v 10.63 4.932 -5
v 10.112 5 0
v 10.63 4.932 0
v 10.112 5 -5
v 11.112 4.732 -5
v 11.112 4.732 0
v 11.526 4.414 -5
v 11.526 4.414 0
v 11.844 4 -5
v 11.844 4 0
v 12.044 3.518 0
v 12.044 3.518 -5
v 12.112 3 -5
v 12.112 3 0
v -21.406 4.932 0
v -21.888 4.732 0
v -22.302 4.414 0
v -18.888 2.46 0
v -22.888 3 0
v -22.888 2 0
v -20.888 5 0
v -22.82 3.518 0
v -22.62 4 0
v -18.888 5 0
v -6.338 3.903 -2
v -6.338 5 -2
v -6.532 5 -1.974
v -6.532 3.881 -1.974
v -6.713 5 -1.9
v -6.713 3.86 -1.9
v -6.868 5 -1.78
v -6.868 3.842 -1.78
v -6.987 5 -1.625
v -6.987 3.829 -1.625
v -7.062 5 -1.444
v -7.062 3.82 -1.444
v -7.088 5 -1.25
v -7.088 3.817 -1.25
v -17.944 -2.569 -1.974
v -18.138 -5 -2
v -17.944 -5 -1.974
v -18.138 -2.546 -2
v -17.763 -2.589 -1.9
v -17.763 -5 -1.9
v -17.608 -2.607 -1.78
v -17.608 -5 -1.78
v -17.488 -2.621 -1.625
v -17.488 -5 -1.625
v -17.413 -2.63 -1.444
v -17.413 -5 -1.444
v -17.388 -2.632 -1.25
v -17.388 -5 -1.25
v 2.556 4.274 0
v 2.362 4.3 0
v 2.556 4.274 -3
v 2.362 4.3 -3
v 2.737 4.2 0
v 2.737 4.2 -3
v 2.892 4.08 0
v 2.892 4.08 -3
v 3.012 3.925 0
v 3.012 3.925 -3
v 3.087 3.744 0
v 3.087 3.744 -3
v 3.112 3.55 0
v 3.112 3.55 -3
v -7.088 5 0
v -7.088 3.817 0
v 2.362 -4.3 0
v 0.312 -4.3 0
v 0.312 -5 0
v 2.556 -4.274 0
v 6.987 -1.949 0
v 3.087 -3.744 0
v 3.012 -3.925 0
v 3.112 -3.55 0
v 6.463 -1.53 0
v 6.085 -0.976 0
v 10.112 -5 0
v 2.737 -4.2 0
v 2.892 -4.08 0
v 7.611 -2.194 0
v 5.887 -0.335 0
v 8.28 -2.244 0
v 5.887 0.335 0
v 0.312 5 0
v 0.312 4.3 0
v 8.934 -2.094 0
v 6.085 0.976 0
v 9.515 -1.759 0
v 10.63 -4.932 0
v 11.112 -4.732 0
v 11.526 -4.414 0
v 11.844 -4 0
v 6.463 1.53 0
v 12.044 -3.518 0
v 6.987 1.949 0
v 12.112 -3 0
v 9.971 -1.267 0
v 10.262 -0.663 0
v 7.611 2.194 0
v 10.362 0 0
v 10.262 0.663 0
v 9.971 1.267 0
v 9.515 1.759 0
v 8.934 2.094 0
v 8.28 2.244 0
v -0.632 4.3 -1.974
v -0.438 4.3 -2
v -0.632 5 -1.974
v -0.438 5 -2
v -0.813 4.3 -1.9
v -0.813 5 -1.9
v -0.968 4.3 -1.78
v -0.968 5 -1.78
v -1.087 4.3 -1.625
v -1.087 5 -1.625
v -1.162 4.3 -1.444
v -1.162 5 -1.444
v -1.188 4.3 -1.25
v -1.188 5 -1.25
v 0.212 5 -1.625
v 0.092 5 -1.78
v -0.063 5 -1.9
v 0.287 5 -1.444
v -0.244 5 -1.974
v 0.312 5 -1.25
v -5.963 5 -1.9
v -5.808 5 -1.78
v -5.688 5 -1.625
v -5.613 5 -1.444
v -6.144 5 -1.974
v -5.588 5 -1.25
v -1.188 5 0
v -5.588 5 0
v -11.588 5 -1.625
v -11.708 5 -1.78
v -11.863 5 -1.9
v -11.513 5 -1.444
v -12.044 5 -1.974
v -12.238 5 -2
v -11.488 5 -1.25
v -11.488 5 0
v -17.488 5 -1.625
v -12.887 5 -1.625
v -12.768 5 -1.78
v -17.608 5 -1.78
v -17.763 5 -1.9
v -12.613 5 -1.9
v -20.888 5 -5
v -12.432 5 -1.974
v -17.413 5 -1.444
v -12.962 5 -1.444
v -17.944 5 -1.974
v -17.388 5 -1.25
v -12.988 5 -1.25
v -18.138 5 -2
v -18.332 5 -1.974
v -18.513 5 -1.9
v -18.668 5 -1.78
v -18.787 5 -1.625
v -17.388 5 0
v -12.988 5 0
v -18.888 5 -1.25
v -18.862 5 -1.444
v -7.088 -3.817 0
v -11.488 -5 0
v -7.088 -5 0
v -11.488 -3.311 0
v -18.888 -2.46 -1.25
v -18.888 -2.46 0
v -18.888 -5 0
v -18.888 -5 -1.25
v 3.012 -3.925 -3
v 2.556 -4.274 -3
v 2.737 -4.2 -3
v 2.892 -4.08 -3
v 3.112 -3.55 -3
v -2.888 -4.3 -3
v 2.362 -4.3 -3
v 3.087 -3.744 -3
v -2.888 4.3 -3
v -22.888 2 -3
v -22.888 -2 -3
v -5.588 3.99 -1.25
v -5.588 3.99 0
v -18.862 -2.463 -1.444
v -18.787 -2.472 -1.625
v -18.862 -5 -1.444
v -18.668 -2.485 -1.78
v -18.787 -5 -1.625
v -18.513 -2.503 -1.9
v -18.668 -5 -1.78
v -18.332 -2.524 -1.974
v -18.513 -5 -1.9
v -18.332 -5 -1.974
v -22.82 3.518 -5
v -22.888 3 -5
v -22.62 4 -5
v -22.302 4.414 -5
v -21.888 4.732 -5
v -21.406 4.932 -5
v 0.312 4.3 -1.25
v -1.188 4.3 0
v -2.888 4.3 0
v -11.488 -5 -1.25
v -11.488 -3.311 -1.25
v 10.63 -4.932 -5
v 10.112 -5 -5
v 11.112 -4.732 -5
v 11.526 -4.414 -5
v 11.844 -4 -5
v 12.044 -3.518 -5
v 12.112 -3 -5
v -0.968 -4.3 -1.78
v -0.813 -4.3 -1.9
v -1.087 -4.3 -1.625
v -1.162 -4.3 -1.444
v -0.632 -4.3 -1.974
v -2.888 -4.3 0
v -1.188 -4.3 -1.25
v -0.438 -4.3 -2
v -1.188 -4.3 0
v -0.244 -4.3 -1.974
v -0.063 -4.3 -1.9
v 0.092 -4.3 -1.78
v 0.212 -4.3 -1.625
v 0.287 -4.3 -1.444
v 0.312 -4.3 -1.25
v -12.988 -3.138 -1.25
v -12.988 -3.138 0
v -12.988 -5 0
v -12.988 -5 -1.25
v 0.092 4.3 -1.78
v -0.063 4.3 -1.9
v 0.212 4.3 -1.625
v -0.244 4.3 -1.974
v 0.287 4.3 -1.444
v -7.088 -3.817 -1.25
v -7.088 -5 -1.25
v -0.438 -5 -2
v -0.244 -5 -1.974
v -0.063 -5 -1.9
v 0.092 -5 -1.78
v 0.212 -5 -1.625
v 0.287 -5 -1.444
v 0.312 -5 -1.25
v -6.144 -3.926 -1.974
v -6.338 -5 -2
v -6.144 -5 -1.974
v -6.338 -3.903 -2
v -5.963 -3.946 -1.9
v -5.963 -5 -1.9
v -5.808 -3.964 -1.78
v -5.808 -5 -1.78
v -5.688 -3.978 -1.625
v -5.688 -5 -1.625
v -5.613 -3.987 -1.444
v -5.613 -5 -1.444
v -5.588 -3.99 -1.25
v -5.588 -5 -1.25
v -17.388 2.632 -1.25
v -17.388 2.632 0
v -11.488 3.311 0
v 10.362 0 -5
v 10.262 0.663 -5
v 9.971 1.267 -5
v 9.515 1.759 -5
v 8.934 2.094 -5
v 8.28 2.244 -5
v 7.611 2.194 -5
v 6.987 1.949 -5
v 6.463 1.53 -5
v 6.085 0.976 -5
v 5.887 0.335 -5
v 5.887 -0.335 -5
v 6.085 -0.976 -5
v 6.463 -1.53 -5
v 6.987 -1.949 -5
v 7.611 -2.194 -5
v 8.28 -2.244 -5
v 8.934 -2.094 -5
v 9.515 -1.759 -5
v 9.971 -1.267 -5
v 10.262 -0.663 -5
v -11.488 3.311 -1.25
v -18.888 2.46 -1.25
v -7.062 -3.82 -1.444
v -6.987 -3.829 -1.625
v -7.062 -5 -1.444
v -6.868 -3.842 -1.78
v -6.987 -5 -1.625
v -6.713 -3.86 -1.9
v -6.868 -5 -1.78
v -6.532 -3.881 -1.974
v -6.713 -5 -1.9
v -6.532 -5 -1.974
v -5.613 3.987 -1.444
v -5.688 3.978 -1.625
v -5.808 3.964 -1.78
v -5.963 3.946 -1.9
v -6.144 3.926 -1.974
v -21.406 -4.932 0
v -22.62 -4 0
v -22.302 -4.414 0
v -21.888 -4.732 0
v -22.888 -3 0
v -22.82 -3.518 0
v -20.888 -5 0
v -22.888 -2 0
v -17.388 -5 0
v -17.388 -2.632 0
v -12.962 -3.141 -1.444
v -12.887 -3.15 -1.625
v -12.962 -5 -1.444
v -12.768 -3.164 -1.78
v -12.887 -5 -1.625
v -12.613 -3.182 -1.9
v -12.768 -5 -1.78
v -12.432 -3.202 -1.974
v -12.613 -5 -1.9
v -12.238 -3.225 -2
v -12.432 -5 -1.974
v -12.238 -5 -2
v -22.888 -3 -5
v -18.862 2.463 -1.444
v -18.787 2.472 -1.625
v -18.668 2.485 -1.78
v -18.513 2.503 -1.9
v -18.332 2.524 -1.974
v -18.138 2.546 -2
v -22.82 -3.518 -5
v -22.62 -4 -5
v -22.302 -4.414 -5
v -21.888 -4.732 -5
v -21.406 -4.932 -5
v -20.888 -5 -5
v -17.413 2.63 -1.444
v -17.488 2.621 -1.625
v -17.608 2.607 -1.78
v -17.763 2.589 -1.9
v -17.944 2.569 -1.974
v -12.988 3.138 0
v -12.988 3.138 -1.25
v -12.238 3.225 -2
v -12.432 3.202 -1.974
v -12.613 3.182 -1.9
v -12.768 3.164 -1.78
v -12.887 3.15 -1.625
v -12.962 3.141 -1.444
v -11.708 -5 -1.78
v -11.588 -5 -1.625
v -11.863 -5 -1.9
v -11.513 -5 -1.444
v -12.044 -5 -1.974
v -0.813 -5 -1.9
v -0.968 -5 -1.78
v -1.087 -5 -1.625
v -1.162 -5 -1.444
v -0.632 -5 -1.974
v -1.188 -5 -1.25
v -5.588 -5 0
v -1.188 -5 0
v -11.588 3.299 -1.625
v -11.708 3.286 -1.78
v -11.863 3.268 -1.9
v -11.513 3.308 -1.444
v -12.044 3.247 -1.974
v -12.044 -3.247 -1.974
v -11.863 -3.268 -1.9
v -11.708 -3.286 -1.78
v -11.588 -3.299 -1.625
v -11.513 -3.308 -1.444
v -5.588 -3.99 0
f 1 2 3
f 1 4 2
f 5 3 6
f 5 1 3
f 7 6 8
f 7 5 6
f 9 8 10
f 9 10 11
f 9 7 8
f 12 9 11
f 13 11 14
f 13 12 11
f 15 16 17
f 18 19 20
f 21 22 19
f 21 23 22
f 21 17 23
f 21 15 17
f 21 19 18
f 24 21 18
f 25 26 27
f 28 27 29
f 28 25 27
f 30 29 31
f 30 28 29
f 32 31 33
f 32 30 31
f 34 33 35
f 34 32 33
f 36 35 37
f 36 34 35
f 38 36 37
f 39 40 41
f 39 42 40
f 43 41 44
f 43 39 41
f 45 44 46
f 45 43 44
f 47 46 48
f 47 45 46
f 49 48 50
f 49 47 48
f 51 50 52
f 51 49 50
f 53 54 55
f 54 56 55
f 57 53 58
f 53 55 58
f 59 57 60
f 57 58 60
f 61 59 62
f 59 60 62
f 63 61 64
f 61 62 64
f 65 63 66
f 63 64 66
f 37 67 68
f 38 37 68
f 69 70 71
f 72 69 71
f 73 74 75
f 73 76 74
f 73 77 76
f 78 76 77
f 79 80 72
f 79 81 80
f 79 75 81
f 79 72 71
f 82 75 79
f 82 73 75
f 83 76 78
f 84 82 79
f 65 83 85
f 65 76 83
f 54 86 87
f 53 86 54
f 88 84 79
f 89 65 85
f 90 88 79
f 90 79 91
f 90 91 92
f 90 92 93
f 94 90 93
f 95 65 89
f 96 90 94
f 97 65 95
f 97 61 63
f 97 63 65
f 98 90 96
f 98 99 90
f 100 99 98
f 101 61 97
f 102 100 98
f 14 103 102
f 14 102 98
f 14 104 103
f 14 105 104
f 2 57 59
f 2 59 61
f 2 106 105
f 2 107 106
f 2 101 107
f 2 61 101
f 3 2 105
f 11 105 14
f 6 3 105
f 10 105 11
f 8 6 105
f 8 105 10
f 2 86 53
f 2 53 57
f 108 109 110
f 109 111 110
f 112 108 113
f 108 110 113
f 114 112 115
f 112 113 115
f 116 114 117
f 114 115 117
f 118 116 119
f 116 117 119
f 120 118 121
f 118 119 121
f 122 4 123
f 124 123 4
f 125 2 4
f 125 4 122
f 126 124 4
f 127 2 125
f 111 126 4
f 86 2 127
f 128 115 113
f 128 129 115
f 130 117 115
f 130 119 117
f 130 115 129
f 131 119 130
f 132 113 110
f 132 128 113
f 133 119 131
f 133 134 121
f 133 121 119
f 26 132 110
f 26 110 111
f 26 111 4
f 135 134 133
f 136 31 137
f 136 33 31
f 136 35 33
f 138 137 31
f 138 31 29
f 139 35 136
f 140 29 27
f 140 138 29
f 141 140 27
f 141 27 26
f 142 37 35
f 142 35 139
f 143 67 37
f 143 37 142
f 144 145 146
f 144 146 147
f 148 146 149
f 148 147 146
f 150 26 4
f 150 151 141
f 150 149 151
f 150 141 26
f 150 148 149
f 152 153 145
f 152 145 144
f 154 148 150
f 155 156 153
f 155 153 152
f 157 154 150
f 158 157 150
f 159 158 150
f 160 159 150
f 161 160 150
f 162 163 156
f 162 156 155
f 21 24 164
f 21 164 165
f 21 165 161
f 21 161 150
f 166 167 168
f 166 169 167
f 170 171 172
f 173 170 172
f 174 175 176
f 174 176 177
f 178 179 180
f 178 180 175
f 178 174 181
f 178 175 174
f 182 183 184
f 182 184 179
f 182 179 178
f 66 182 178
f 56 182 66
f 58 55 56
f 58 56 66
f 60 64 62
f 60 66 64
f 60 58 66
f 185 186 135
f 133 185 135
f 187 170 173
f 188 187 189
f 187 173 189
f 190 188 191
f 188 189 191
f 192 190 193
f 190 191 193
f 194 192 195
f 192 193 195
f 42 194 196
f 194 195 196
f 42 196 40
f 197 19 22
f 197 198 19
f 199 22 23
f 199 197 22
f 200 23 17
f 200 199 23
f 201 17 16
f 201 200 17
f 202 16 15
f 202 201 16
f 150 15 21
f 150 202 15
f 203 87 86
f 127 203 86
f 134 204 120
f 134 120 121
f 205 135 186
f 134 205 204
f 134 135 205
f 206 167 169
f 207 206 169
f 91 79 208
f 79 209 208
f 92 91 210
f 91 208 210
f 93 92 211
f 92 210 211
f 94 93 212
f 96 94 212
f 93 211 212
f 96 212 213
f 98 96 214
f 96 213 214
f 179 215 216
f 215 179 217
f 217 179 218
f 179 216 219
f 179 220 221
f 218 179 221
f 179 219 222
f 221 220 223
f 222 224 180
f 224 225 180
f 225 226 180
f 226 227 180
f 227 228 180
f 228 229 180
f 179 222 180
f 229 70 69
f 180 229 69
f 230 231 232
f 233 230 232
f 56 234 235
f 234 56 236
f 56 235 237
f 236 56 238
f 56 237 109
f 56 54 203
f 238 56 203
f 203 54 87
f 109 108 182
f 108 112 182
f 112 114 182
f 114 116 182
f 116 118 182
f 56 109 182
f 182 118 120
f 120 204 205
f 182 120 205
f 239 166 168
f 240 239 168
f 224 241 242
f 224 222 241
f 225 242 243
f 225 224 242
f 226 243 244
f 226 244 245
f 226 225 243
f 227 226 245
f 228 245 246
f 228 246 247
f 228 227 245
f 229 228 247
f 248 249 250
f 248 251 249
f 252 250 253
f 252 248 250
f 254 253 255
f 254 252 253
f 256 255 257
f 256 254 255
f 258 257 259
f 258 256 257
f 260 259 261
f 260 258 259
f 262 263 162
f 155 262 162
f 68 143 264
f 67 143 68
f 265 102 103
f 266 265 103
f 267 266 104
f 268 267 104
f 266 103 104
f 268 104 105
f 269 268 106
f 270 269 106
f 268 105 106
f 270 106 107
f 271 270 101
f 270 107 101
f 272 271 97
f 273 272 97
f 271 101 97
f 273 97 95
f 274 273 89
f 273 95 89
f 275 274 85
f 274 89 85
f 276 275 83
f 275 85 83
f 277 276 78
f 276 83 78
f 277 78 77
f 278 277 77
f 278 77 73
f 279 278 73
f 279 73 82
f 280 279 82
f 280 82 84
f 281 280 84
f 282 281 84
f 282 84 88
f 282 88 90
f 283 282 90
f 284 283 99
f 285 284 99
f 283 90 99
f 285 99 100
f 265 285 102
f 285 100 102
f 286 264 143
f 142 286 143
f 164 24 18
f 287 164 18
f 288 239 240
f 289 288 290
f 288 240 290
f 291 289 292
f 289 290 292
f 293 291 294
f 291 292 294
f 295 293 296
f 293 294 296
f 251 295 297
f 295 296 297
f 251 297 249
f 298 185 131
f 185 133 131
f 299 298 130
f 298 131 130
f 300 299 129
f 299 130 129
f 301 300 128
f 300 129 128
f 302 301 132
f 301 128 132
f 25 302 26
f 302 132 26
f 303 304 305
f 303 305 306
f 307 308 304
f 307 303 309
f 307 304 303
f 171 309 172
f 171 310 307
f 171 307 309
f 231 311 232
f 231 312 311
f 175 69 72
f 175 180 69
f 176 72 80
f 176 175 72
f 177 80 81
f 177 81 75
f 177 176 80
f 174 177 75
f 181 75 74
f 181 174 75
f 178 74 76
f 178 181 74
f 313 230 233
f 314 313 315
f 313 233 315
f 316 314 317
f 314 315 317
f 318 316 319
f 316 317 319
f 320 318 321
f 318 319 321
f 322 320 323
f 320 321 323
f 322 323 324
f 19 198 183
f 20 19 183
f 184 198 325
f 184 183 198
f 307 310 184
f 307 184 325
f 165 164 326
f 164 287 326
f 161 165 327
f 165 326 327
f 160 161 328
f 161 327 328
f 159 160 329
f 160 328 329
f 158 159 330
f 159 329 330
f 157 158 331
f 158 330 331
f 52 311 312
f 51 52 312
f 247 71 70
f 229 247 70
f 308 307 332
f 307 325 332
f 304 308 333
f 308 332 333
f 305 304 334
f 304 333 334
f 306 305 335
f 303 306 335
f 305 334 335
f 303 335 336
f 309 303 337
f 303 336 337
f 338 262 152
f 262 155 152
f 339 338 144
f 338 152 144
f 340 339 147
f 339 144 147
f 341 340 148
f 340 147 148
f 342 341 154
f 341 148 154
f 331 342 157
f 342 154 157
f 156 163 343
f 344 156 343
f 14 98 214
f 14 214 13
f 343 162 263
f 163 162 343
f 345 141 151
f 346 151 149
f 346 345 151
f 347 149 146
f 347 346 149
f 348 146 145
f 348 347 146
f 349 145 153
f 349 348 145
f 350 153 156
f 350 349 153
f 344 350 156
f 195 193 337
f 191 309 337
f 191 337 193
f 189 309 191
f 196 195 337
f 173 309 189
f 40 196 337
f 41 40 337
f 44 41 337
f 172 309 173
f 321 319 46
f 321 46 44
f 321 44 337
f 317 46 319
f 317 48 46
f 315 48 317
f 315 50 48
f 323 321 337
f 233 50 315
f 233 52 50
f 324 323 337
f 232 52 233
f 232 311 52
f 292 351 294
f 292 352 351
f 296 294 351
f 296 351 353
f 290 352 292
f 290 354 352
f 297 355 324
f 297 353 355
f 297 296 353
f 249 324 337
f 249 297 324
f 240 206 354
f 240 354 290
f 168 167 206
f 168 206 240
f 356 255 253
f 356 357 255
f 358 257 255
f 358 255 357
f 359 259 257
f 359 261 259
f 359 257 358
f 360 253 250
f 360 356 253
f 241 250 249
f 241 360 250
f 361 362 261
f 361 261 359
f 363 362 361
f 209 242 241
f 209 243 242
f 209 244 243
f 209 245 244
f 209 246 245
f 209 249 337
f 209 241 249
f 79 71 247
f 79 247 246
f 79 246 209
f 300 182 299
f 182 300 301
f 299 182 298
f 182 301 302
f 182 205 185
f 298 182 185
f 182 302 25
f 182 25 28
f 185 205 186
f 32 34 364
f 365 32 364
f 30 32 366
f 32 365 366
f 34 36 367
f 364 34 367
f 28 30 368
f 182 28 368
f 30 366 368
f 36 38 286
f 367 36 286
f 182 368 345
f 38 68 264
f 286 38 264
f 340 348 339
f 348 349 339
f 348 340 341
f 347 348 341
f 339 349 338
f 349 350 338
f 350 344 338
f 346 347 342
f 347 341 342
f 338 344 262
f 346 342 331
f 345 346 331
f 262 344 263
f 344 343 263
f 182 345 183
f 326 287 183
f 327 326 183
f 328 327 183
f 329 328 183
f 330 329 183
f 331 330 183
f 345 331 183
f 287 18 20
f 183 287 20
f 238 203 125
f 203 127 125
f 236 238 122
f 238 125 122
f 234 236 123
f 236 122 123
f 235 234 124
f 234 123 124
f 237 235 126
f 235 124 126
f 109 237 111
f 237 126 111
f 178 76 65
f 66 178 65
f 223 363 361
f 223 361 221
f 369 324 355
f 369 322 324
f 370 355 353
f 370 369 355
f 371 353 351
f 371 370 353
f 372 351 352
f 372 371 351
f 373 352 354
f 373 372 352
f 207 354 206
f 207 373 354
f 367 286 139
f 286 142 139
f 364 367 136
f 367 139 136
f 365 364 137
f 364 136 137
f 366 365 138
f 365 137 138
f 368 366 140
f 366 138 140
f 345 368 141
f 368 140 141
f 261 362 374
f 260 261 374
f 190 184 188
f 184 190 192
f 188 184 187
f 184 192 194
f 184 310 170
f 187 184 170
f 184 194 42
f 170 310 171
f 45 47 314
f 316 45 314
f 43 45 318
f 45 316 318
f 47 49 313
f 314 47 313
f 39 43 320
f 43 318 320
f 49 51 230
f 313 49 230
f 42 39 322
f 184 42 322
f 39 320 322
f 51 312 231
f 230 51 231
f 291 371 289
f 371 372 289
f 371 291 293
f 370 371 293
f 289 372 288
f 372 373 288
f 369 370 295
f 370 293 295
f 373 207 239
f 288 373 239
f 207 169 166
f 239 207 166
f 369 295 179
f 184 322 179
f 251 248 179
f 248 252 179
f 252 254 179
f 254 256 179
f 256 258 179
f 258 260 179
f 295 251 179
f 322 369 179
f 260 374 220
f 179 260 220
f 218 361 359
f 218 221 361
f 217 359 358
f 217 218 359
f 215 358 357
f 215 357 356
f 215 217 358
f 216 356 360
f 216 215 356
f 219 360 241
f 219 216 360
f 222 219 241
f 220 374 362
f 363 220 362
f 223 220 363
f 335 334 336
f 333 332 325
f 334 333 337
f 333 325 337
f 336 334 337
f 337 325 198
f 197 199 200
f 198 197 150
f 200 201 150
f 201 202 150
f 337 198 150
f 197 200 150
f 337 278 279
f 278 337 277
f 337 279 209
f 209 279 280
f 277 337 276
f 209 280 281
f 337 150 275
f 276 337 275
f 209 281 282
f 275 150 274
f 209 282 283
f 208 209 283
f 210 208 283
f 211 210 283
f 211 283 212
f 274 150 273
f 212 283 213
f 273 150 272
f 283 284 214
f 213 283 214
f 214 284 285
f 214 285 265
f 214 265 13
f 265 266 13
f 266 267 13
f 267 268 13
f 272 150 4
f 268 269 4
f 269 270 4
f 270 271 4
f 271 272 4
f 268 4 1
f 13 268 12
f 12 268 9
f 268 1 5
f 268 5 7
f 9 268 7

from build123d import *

# Parameters (mm, degrees)
F0_W     = 1.5
F0_H     = 0.7
F0_R     = 2.25
F0_H_2   = 8.6
F0_W_2   = 2.8
F1_DEPTH = 5
F2_DEPTH = 3
F3_DEPTH = 2
F4_R     = 0.74999
F5_R     = 2


# Not quite as in the source:
# - a fillet or chamfer is up to 0.001 mm smaller than in the source, because OpenCascade refuses the exact size


with BuildPart() as f1:
    # F0 (on Top) → F1 (new body)
    with BuildSketch(Plane.XY):
        Polygon((-18.8879279066, 5), (-22.8879279066, 5), (-22.8879279066, 2), (-18.8879279066, 2.46), align=None)
        Polygon((-17.3879279066, 5), (-18.8879279066, 5), (-18.8879279066, 2.46), (-17.3879279066, 2.6325), align=None)
        Polygon((-18.8879279066, 2.46), (-22.8879279066, 2), (-22.8879279066, -2), (-18.8879279066, -2.46), align=None)
        Polygon((-12.9879279066, 5), (-17.3879279066, 5), (-17.3879279066, 2.6325), (-12.9879279066, 3.1385), align=None)
        Polygon((-18.8879279066, -2.46), (-22.8879279066, -2), (-22.8879279066, -5), (-18.8879279066, -5), align=None)
        Polygon((-11.4879279066, 5), (-12.9879279066, 5), (-12.9879279066, 3.1385), (-11.4879279066, 3.311), align=None)
        Polygon((-17.3879279066, -2.6325), (-18.8879279066, -2.46), (-18.8879279066, -5), (-17.3879279066, -5), align=None)
        Polygon((-7.0879279066, 5), (-11.4879279066, 5), (-11.4879279066, 3.311), (-7.0879279066, 3.817), align=None)
        Polygon((-12.9879279066, -3.1385), (-17.3879279066, -2.6325), (-17.3879279066, -5), (-12.9879279066, -5), align=None)
        Polygon((-5.5879279066, 5), (-7.0879279066, 5), (-7.0879279066, 3.817), (-5.5879279066, 3.9895), align=None)
        Polygon((-11.4879279066, -3.311), (-12.9879279066, -3.1385), (-12.9879279066, -5), (-11.4879279066, -5), align=None)
        Polygon((-1.1879279066, 5), (-5.5879279066, 5), (-5.5879279066, 3.9895), (-2.8879279066, 4.3), (-1.1879279066, 4.3), align=None)
        Polygon((-7.0879279066, -3.817), (-11.4879279066, -3.311), (-11.4879279066, -5), (-7.0879279066, -5), align=None)
        with Locations((-0.4379279066, 4.65)):
            Rectangle(F0_W, F0_H)
        Polygon((-5.5879279066, -3.9895), (-7.0879279066, -3.817), (-7.0879279066, -5), (-5.5879279066, -5), align=None)
        Polygon((12.1120720934, 5), (0.3120720934, 5), (0.3120720934, 4.3), (3.1120720934, 4.3), (3.1120720934, -4.3), (0.3120720934, -4.3), (0.3120720934, -5), (12.1120720934, -5), align=None)
        with Locations((8.1120720934, 0)):
            Circle(F0_R, mode=Mode.SUBTRACT)
        Polygon((-2.8879279066, -4.3), (-5.5879279066, -3.9895), (-5.5879279066, -5), (-1.1879279066, -5), (-1.1879279066, -4.3), align=None)
        with Locations((-0.4379279066, -4.65)):
            Rectangle(F0_W, F0_H)
        with Locations((-0.4379279066, 0)):
            Rectangle(F0_W, F0_H_2)
        Polygon((-5.5879279066, 3.9895), (-7.0879279066, 3.817), (-7.0879279066, -3.817), (-5.5879279066, -3.9895), align=None)
        Polygon((-17.3879279066, 2.6325), (-18.8879279066, 2.46), (-18.8879279066, -2.46), (-17.3879279066, -2.6325), align=None)
        Polygon((-12.9879279066, 3.1385), (-17.3879279066, 2.6325), (-17.3879279066, -2.6325), (-12.9879279066, -3.1385), align=None)
        Polygon((-7.0879279066, 3.817), (-11.4879279066, 3.311), (-11.4879279066, -3.311), (-7.0879279066, -3.817), align=None)
        Polygon((-11.4879279066, 3.311), (-12.9879279066, 3.1385), (-12.9879279066, -3.1385), (-11.4879279066, -3.311), align=None)
        Polygon((-2.8879279066, 4.3), (-5.5879279066, 3.9895), (-5.5879279066, -3.9895), (-2.8879279066, -4.3), (-1.1879279066, -4.3), (-1.1879279066, 4.3), align=None)
        with Locations((1.7120720934, 0)):
            Rectangle(F0_W_2, F0_H_2)
    extrude(amount=-F1_DEPTH)

    # F0 (on Top) → F2 (cut)
    with BuildSketch(Plane.XY):
        Polygon((-18.8879279066, 2.46), (-22.8879279066, 2), (-22.8879279066, -2), (-18.8879279066, -2.46), align=None)
        Polygon((-17.3879279066, 2.6325), (-18.8879279066, 2.46), (-18.8879279066, -2.46), (-17.3879279066, -2.6325), align=None)
        Polygon((-12.9879279066, 3.1385), (-17.3879279066, 2.6325), (-17.3879279066, -2.6325), (-12.9879279066, -3.1385), align=None)
        Polygon((-11.4879279066, 3.311), (-12.9879279066, 3.1385), (-12.9879279066, -3.1385), (-11.4879279066, -3.311), align=None)
        Polygon((-7.0879279066, 3.817), (-11.4879279066, 3.311), (-11.4879279066, -3.311), (-7.0879279066, -3.817), align=None)
        Polygon((-5.5879279066, 3.9895), (-7.0879279066, 3.817), (-7.0879279066, -3.817), (-5.5879279066, -3.9895), align=None)
        Polygon((-2.8879279066, 4.3), (-5.5879279066, 3.9895), (-5.5879279066, -3.9895), (-2.8879279066, -4.3), (-1.1879279066, -4.3), (-1.1879279066, 4.3), align=None)
        with Locations((-0.4379279066, 0)):
            Rectangle(F0_W, F0_H_2)
        with Locations((1.7120720934, 0)):
            Rectangle(F0_W_2, F0_H_2)
    extrude(amount=-F2_DEPTH, mode=Mode.SUBTRACT)

    # F0 (on Top) → F3 (cut)
    with BuildSketch(Plane.XY):
        Polygon((-17.3879279066, 5), (-18.8879279066, 5), (-18.8879279066, 2.46), (-17.3879279066, 2.6325), align=None)
        Polygon((-11.4879279066, 5), (-12.9879279066, 5), (-12.9879279066, 3.1385), (-11.4879279066, 3.311), align=None)
        Polygon((-5.5879279066, 5), (-7.0879279066, 5), (-7.0879279066, 3.817), (-5.5879279066, 3.9895), align=None)
        with Locations((-0.4379279066, -4.65)):
            Rectangle(F0_W, F0_H)
        Polygon((-17.3879279066, -2.6325), (-18.8879279066, -2.46), (-18.8879279066, -5), (-17.3879279066, -5), align=None)
        Polygon((-11.4879279066, -3.311), (-12.9879279066, -3.1385), (-12.9879279066, -5), (-11.4879279066, -5), align=None)
        Polygon((-5.5879279066, -3.9895), (-7.0879279066, -3.817), (-7.0879279066, -5), (-5.5879279066, -5), align=None)
        with Locations((-0.4379279066, 4.65)):
            Rectangle(F0_W, F0_H)
    extrude(amount=-F3_DEPTH, mode=Mode.SUBTRACT)

    # F4 (radius 0.75 in the source; OpenCascade refuses exactly that, so slightly less here)
    f4_edges = [f1.edges().sort_by_distance(p)[0] for p in [
        (-17.387928, -3.81625, -2),
        (-11.487928, -4.1555, -2),
        (-5.587928, -4.49475, -2),
        (0.312072, -4.65, -2),
        (-18.887928, -3.73, -2),
        (-12.987928, -4.06925, -2),
        (-7.087928, -4.4085, -2),
        (-1.187928, -4.65, -2),
        (-18.887928, 3.73, -2),
        (-12.987928, 4.06925, -2),
        (-7.087928, 4.4085, -2),
        (-1.187928, 4.65, -2),
        (-17.387928, 3.81625, -2),
        (-11.487928, 4.1555, -2),
        (-5.587928, 4.49475, -2),
        (0.312072, 4.65, -2),
        (3.112072, 4.3, -1.5),
        (3.112072, -4.3, -1.5),
    ]]
    fillet(f4_edges, radius=F4_R)

    # F5
    f5_edges = [f1.edges().sort_by_distance(p)[0] for p in [
        (-22.887928, -5, -2.5),
        (-22.887928, 5, -2.5),
        (12.112072, -5, -2.5),
        (12.112072, 5, -2.5),
    ]]
    fillet(f5_edges, radius=F5_R)


solid = f1.part
